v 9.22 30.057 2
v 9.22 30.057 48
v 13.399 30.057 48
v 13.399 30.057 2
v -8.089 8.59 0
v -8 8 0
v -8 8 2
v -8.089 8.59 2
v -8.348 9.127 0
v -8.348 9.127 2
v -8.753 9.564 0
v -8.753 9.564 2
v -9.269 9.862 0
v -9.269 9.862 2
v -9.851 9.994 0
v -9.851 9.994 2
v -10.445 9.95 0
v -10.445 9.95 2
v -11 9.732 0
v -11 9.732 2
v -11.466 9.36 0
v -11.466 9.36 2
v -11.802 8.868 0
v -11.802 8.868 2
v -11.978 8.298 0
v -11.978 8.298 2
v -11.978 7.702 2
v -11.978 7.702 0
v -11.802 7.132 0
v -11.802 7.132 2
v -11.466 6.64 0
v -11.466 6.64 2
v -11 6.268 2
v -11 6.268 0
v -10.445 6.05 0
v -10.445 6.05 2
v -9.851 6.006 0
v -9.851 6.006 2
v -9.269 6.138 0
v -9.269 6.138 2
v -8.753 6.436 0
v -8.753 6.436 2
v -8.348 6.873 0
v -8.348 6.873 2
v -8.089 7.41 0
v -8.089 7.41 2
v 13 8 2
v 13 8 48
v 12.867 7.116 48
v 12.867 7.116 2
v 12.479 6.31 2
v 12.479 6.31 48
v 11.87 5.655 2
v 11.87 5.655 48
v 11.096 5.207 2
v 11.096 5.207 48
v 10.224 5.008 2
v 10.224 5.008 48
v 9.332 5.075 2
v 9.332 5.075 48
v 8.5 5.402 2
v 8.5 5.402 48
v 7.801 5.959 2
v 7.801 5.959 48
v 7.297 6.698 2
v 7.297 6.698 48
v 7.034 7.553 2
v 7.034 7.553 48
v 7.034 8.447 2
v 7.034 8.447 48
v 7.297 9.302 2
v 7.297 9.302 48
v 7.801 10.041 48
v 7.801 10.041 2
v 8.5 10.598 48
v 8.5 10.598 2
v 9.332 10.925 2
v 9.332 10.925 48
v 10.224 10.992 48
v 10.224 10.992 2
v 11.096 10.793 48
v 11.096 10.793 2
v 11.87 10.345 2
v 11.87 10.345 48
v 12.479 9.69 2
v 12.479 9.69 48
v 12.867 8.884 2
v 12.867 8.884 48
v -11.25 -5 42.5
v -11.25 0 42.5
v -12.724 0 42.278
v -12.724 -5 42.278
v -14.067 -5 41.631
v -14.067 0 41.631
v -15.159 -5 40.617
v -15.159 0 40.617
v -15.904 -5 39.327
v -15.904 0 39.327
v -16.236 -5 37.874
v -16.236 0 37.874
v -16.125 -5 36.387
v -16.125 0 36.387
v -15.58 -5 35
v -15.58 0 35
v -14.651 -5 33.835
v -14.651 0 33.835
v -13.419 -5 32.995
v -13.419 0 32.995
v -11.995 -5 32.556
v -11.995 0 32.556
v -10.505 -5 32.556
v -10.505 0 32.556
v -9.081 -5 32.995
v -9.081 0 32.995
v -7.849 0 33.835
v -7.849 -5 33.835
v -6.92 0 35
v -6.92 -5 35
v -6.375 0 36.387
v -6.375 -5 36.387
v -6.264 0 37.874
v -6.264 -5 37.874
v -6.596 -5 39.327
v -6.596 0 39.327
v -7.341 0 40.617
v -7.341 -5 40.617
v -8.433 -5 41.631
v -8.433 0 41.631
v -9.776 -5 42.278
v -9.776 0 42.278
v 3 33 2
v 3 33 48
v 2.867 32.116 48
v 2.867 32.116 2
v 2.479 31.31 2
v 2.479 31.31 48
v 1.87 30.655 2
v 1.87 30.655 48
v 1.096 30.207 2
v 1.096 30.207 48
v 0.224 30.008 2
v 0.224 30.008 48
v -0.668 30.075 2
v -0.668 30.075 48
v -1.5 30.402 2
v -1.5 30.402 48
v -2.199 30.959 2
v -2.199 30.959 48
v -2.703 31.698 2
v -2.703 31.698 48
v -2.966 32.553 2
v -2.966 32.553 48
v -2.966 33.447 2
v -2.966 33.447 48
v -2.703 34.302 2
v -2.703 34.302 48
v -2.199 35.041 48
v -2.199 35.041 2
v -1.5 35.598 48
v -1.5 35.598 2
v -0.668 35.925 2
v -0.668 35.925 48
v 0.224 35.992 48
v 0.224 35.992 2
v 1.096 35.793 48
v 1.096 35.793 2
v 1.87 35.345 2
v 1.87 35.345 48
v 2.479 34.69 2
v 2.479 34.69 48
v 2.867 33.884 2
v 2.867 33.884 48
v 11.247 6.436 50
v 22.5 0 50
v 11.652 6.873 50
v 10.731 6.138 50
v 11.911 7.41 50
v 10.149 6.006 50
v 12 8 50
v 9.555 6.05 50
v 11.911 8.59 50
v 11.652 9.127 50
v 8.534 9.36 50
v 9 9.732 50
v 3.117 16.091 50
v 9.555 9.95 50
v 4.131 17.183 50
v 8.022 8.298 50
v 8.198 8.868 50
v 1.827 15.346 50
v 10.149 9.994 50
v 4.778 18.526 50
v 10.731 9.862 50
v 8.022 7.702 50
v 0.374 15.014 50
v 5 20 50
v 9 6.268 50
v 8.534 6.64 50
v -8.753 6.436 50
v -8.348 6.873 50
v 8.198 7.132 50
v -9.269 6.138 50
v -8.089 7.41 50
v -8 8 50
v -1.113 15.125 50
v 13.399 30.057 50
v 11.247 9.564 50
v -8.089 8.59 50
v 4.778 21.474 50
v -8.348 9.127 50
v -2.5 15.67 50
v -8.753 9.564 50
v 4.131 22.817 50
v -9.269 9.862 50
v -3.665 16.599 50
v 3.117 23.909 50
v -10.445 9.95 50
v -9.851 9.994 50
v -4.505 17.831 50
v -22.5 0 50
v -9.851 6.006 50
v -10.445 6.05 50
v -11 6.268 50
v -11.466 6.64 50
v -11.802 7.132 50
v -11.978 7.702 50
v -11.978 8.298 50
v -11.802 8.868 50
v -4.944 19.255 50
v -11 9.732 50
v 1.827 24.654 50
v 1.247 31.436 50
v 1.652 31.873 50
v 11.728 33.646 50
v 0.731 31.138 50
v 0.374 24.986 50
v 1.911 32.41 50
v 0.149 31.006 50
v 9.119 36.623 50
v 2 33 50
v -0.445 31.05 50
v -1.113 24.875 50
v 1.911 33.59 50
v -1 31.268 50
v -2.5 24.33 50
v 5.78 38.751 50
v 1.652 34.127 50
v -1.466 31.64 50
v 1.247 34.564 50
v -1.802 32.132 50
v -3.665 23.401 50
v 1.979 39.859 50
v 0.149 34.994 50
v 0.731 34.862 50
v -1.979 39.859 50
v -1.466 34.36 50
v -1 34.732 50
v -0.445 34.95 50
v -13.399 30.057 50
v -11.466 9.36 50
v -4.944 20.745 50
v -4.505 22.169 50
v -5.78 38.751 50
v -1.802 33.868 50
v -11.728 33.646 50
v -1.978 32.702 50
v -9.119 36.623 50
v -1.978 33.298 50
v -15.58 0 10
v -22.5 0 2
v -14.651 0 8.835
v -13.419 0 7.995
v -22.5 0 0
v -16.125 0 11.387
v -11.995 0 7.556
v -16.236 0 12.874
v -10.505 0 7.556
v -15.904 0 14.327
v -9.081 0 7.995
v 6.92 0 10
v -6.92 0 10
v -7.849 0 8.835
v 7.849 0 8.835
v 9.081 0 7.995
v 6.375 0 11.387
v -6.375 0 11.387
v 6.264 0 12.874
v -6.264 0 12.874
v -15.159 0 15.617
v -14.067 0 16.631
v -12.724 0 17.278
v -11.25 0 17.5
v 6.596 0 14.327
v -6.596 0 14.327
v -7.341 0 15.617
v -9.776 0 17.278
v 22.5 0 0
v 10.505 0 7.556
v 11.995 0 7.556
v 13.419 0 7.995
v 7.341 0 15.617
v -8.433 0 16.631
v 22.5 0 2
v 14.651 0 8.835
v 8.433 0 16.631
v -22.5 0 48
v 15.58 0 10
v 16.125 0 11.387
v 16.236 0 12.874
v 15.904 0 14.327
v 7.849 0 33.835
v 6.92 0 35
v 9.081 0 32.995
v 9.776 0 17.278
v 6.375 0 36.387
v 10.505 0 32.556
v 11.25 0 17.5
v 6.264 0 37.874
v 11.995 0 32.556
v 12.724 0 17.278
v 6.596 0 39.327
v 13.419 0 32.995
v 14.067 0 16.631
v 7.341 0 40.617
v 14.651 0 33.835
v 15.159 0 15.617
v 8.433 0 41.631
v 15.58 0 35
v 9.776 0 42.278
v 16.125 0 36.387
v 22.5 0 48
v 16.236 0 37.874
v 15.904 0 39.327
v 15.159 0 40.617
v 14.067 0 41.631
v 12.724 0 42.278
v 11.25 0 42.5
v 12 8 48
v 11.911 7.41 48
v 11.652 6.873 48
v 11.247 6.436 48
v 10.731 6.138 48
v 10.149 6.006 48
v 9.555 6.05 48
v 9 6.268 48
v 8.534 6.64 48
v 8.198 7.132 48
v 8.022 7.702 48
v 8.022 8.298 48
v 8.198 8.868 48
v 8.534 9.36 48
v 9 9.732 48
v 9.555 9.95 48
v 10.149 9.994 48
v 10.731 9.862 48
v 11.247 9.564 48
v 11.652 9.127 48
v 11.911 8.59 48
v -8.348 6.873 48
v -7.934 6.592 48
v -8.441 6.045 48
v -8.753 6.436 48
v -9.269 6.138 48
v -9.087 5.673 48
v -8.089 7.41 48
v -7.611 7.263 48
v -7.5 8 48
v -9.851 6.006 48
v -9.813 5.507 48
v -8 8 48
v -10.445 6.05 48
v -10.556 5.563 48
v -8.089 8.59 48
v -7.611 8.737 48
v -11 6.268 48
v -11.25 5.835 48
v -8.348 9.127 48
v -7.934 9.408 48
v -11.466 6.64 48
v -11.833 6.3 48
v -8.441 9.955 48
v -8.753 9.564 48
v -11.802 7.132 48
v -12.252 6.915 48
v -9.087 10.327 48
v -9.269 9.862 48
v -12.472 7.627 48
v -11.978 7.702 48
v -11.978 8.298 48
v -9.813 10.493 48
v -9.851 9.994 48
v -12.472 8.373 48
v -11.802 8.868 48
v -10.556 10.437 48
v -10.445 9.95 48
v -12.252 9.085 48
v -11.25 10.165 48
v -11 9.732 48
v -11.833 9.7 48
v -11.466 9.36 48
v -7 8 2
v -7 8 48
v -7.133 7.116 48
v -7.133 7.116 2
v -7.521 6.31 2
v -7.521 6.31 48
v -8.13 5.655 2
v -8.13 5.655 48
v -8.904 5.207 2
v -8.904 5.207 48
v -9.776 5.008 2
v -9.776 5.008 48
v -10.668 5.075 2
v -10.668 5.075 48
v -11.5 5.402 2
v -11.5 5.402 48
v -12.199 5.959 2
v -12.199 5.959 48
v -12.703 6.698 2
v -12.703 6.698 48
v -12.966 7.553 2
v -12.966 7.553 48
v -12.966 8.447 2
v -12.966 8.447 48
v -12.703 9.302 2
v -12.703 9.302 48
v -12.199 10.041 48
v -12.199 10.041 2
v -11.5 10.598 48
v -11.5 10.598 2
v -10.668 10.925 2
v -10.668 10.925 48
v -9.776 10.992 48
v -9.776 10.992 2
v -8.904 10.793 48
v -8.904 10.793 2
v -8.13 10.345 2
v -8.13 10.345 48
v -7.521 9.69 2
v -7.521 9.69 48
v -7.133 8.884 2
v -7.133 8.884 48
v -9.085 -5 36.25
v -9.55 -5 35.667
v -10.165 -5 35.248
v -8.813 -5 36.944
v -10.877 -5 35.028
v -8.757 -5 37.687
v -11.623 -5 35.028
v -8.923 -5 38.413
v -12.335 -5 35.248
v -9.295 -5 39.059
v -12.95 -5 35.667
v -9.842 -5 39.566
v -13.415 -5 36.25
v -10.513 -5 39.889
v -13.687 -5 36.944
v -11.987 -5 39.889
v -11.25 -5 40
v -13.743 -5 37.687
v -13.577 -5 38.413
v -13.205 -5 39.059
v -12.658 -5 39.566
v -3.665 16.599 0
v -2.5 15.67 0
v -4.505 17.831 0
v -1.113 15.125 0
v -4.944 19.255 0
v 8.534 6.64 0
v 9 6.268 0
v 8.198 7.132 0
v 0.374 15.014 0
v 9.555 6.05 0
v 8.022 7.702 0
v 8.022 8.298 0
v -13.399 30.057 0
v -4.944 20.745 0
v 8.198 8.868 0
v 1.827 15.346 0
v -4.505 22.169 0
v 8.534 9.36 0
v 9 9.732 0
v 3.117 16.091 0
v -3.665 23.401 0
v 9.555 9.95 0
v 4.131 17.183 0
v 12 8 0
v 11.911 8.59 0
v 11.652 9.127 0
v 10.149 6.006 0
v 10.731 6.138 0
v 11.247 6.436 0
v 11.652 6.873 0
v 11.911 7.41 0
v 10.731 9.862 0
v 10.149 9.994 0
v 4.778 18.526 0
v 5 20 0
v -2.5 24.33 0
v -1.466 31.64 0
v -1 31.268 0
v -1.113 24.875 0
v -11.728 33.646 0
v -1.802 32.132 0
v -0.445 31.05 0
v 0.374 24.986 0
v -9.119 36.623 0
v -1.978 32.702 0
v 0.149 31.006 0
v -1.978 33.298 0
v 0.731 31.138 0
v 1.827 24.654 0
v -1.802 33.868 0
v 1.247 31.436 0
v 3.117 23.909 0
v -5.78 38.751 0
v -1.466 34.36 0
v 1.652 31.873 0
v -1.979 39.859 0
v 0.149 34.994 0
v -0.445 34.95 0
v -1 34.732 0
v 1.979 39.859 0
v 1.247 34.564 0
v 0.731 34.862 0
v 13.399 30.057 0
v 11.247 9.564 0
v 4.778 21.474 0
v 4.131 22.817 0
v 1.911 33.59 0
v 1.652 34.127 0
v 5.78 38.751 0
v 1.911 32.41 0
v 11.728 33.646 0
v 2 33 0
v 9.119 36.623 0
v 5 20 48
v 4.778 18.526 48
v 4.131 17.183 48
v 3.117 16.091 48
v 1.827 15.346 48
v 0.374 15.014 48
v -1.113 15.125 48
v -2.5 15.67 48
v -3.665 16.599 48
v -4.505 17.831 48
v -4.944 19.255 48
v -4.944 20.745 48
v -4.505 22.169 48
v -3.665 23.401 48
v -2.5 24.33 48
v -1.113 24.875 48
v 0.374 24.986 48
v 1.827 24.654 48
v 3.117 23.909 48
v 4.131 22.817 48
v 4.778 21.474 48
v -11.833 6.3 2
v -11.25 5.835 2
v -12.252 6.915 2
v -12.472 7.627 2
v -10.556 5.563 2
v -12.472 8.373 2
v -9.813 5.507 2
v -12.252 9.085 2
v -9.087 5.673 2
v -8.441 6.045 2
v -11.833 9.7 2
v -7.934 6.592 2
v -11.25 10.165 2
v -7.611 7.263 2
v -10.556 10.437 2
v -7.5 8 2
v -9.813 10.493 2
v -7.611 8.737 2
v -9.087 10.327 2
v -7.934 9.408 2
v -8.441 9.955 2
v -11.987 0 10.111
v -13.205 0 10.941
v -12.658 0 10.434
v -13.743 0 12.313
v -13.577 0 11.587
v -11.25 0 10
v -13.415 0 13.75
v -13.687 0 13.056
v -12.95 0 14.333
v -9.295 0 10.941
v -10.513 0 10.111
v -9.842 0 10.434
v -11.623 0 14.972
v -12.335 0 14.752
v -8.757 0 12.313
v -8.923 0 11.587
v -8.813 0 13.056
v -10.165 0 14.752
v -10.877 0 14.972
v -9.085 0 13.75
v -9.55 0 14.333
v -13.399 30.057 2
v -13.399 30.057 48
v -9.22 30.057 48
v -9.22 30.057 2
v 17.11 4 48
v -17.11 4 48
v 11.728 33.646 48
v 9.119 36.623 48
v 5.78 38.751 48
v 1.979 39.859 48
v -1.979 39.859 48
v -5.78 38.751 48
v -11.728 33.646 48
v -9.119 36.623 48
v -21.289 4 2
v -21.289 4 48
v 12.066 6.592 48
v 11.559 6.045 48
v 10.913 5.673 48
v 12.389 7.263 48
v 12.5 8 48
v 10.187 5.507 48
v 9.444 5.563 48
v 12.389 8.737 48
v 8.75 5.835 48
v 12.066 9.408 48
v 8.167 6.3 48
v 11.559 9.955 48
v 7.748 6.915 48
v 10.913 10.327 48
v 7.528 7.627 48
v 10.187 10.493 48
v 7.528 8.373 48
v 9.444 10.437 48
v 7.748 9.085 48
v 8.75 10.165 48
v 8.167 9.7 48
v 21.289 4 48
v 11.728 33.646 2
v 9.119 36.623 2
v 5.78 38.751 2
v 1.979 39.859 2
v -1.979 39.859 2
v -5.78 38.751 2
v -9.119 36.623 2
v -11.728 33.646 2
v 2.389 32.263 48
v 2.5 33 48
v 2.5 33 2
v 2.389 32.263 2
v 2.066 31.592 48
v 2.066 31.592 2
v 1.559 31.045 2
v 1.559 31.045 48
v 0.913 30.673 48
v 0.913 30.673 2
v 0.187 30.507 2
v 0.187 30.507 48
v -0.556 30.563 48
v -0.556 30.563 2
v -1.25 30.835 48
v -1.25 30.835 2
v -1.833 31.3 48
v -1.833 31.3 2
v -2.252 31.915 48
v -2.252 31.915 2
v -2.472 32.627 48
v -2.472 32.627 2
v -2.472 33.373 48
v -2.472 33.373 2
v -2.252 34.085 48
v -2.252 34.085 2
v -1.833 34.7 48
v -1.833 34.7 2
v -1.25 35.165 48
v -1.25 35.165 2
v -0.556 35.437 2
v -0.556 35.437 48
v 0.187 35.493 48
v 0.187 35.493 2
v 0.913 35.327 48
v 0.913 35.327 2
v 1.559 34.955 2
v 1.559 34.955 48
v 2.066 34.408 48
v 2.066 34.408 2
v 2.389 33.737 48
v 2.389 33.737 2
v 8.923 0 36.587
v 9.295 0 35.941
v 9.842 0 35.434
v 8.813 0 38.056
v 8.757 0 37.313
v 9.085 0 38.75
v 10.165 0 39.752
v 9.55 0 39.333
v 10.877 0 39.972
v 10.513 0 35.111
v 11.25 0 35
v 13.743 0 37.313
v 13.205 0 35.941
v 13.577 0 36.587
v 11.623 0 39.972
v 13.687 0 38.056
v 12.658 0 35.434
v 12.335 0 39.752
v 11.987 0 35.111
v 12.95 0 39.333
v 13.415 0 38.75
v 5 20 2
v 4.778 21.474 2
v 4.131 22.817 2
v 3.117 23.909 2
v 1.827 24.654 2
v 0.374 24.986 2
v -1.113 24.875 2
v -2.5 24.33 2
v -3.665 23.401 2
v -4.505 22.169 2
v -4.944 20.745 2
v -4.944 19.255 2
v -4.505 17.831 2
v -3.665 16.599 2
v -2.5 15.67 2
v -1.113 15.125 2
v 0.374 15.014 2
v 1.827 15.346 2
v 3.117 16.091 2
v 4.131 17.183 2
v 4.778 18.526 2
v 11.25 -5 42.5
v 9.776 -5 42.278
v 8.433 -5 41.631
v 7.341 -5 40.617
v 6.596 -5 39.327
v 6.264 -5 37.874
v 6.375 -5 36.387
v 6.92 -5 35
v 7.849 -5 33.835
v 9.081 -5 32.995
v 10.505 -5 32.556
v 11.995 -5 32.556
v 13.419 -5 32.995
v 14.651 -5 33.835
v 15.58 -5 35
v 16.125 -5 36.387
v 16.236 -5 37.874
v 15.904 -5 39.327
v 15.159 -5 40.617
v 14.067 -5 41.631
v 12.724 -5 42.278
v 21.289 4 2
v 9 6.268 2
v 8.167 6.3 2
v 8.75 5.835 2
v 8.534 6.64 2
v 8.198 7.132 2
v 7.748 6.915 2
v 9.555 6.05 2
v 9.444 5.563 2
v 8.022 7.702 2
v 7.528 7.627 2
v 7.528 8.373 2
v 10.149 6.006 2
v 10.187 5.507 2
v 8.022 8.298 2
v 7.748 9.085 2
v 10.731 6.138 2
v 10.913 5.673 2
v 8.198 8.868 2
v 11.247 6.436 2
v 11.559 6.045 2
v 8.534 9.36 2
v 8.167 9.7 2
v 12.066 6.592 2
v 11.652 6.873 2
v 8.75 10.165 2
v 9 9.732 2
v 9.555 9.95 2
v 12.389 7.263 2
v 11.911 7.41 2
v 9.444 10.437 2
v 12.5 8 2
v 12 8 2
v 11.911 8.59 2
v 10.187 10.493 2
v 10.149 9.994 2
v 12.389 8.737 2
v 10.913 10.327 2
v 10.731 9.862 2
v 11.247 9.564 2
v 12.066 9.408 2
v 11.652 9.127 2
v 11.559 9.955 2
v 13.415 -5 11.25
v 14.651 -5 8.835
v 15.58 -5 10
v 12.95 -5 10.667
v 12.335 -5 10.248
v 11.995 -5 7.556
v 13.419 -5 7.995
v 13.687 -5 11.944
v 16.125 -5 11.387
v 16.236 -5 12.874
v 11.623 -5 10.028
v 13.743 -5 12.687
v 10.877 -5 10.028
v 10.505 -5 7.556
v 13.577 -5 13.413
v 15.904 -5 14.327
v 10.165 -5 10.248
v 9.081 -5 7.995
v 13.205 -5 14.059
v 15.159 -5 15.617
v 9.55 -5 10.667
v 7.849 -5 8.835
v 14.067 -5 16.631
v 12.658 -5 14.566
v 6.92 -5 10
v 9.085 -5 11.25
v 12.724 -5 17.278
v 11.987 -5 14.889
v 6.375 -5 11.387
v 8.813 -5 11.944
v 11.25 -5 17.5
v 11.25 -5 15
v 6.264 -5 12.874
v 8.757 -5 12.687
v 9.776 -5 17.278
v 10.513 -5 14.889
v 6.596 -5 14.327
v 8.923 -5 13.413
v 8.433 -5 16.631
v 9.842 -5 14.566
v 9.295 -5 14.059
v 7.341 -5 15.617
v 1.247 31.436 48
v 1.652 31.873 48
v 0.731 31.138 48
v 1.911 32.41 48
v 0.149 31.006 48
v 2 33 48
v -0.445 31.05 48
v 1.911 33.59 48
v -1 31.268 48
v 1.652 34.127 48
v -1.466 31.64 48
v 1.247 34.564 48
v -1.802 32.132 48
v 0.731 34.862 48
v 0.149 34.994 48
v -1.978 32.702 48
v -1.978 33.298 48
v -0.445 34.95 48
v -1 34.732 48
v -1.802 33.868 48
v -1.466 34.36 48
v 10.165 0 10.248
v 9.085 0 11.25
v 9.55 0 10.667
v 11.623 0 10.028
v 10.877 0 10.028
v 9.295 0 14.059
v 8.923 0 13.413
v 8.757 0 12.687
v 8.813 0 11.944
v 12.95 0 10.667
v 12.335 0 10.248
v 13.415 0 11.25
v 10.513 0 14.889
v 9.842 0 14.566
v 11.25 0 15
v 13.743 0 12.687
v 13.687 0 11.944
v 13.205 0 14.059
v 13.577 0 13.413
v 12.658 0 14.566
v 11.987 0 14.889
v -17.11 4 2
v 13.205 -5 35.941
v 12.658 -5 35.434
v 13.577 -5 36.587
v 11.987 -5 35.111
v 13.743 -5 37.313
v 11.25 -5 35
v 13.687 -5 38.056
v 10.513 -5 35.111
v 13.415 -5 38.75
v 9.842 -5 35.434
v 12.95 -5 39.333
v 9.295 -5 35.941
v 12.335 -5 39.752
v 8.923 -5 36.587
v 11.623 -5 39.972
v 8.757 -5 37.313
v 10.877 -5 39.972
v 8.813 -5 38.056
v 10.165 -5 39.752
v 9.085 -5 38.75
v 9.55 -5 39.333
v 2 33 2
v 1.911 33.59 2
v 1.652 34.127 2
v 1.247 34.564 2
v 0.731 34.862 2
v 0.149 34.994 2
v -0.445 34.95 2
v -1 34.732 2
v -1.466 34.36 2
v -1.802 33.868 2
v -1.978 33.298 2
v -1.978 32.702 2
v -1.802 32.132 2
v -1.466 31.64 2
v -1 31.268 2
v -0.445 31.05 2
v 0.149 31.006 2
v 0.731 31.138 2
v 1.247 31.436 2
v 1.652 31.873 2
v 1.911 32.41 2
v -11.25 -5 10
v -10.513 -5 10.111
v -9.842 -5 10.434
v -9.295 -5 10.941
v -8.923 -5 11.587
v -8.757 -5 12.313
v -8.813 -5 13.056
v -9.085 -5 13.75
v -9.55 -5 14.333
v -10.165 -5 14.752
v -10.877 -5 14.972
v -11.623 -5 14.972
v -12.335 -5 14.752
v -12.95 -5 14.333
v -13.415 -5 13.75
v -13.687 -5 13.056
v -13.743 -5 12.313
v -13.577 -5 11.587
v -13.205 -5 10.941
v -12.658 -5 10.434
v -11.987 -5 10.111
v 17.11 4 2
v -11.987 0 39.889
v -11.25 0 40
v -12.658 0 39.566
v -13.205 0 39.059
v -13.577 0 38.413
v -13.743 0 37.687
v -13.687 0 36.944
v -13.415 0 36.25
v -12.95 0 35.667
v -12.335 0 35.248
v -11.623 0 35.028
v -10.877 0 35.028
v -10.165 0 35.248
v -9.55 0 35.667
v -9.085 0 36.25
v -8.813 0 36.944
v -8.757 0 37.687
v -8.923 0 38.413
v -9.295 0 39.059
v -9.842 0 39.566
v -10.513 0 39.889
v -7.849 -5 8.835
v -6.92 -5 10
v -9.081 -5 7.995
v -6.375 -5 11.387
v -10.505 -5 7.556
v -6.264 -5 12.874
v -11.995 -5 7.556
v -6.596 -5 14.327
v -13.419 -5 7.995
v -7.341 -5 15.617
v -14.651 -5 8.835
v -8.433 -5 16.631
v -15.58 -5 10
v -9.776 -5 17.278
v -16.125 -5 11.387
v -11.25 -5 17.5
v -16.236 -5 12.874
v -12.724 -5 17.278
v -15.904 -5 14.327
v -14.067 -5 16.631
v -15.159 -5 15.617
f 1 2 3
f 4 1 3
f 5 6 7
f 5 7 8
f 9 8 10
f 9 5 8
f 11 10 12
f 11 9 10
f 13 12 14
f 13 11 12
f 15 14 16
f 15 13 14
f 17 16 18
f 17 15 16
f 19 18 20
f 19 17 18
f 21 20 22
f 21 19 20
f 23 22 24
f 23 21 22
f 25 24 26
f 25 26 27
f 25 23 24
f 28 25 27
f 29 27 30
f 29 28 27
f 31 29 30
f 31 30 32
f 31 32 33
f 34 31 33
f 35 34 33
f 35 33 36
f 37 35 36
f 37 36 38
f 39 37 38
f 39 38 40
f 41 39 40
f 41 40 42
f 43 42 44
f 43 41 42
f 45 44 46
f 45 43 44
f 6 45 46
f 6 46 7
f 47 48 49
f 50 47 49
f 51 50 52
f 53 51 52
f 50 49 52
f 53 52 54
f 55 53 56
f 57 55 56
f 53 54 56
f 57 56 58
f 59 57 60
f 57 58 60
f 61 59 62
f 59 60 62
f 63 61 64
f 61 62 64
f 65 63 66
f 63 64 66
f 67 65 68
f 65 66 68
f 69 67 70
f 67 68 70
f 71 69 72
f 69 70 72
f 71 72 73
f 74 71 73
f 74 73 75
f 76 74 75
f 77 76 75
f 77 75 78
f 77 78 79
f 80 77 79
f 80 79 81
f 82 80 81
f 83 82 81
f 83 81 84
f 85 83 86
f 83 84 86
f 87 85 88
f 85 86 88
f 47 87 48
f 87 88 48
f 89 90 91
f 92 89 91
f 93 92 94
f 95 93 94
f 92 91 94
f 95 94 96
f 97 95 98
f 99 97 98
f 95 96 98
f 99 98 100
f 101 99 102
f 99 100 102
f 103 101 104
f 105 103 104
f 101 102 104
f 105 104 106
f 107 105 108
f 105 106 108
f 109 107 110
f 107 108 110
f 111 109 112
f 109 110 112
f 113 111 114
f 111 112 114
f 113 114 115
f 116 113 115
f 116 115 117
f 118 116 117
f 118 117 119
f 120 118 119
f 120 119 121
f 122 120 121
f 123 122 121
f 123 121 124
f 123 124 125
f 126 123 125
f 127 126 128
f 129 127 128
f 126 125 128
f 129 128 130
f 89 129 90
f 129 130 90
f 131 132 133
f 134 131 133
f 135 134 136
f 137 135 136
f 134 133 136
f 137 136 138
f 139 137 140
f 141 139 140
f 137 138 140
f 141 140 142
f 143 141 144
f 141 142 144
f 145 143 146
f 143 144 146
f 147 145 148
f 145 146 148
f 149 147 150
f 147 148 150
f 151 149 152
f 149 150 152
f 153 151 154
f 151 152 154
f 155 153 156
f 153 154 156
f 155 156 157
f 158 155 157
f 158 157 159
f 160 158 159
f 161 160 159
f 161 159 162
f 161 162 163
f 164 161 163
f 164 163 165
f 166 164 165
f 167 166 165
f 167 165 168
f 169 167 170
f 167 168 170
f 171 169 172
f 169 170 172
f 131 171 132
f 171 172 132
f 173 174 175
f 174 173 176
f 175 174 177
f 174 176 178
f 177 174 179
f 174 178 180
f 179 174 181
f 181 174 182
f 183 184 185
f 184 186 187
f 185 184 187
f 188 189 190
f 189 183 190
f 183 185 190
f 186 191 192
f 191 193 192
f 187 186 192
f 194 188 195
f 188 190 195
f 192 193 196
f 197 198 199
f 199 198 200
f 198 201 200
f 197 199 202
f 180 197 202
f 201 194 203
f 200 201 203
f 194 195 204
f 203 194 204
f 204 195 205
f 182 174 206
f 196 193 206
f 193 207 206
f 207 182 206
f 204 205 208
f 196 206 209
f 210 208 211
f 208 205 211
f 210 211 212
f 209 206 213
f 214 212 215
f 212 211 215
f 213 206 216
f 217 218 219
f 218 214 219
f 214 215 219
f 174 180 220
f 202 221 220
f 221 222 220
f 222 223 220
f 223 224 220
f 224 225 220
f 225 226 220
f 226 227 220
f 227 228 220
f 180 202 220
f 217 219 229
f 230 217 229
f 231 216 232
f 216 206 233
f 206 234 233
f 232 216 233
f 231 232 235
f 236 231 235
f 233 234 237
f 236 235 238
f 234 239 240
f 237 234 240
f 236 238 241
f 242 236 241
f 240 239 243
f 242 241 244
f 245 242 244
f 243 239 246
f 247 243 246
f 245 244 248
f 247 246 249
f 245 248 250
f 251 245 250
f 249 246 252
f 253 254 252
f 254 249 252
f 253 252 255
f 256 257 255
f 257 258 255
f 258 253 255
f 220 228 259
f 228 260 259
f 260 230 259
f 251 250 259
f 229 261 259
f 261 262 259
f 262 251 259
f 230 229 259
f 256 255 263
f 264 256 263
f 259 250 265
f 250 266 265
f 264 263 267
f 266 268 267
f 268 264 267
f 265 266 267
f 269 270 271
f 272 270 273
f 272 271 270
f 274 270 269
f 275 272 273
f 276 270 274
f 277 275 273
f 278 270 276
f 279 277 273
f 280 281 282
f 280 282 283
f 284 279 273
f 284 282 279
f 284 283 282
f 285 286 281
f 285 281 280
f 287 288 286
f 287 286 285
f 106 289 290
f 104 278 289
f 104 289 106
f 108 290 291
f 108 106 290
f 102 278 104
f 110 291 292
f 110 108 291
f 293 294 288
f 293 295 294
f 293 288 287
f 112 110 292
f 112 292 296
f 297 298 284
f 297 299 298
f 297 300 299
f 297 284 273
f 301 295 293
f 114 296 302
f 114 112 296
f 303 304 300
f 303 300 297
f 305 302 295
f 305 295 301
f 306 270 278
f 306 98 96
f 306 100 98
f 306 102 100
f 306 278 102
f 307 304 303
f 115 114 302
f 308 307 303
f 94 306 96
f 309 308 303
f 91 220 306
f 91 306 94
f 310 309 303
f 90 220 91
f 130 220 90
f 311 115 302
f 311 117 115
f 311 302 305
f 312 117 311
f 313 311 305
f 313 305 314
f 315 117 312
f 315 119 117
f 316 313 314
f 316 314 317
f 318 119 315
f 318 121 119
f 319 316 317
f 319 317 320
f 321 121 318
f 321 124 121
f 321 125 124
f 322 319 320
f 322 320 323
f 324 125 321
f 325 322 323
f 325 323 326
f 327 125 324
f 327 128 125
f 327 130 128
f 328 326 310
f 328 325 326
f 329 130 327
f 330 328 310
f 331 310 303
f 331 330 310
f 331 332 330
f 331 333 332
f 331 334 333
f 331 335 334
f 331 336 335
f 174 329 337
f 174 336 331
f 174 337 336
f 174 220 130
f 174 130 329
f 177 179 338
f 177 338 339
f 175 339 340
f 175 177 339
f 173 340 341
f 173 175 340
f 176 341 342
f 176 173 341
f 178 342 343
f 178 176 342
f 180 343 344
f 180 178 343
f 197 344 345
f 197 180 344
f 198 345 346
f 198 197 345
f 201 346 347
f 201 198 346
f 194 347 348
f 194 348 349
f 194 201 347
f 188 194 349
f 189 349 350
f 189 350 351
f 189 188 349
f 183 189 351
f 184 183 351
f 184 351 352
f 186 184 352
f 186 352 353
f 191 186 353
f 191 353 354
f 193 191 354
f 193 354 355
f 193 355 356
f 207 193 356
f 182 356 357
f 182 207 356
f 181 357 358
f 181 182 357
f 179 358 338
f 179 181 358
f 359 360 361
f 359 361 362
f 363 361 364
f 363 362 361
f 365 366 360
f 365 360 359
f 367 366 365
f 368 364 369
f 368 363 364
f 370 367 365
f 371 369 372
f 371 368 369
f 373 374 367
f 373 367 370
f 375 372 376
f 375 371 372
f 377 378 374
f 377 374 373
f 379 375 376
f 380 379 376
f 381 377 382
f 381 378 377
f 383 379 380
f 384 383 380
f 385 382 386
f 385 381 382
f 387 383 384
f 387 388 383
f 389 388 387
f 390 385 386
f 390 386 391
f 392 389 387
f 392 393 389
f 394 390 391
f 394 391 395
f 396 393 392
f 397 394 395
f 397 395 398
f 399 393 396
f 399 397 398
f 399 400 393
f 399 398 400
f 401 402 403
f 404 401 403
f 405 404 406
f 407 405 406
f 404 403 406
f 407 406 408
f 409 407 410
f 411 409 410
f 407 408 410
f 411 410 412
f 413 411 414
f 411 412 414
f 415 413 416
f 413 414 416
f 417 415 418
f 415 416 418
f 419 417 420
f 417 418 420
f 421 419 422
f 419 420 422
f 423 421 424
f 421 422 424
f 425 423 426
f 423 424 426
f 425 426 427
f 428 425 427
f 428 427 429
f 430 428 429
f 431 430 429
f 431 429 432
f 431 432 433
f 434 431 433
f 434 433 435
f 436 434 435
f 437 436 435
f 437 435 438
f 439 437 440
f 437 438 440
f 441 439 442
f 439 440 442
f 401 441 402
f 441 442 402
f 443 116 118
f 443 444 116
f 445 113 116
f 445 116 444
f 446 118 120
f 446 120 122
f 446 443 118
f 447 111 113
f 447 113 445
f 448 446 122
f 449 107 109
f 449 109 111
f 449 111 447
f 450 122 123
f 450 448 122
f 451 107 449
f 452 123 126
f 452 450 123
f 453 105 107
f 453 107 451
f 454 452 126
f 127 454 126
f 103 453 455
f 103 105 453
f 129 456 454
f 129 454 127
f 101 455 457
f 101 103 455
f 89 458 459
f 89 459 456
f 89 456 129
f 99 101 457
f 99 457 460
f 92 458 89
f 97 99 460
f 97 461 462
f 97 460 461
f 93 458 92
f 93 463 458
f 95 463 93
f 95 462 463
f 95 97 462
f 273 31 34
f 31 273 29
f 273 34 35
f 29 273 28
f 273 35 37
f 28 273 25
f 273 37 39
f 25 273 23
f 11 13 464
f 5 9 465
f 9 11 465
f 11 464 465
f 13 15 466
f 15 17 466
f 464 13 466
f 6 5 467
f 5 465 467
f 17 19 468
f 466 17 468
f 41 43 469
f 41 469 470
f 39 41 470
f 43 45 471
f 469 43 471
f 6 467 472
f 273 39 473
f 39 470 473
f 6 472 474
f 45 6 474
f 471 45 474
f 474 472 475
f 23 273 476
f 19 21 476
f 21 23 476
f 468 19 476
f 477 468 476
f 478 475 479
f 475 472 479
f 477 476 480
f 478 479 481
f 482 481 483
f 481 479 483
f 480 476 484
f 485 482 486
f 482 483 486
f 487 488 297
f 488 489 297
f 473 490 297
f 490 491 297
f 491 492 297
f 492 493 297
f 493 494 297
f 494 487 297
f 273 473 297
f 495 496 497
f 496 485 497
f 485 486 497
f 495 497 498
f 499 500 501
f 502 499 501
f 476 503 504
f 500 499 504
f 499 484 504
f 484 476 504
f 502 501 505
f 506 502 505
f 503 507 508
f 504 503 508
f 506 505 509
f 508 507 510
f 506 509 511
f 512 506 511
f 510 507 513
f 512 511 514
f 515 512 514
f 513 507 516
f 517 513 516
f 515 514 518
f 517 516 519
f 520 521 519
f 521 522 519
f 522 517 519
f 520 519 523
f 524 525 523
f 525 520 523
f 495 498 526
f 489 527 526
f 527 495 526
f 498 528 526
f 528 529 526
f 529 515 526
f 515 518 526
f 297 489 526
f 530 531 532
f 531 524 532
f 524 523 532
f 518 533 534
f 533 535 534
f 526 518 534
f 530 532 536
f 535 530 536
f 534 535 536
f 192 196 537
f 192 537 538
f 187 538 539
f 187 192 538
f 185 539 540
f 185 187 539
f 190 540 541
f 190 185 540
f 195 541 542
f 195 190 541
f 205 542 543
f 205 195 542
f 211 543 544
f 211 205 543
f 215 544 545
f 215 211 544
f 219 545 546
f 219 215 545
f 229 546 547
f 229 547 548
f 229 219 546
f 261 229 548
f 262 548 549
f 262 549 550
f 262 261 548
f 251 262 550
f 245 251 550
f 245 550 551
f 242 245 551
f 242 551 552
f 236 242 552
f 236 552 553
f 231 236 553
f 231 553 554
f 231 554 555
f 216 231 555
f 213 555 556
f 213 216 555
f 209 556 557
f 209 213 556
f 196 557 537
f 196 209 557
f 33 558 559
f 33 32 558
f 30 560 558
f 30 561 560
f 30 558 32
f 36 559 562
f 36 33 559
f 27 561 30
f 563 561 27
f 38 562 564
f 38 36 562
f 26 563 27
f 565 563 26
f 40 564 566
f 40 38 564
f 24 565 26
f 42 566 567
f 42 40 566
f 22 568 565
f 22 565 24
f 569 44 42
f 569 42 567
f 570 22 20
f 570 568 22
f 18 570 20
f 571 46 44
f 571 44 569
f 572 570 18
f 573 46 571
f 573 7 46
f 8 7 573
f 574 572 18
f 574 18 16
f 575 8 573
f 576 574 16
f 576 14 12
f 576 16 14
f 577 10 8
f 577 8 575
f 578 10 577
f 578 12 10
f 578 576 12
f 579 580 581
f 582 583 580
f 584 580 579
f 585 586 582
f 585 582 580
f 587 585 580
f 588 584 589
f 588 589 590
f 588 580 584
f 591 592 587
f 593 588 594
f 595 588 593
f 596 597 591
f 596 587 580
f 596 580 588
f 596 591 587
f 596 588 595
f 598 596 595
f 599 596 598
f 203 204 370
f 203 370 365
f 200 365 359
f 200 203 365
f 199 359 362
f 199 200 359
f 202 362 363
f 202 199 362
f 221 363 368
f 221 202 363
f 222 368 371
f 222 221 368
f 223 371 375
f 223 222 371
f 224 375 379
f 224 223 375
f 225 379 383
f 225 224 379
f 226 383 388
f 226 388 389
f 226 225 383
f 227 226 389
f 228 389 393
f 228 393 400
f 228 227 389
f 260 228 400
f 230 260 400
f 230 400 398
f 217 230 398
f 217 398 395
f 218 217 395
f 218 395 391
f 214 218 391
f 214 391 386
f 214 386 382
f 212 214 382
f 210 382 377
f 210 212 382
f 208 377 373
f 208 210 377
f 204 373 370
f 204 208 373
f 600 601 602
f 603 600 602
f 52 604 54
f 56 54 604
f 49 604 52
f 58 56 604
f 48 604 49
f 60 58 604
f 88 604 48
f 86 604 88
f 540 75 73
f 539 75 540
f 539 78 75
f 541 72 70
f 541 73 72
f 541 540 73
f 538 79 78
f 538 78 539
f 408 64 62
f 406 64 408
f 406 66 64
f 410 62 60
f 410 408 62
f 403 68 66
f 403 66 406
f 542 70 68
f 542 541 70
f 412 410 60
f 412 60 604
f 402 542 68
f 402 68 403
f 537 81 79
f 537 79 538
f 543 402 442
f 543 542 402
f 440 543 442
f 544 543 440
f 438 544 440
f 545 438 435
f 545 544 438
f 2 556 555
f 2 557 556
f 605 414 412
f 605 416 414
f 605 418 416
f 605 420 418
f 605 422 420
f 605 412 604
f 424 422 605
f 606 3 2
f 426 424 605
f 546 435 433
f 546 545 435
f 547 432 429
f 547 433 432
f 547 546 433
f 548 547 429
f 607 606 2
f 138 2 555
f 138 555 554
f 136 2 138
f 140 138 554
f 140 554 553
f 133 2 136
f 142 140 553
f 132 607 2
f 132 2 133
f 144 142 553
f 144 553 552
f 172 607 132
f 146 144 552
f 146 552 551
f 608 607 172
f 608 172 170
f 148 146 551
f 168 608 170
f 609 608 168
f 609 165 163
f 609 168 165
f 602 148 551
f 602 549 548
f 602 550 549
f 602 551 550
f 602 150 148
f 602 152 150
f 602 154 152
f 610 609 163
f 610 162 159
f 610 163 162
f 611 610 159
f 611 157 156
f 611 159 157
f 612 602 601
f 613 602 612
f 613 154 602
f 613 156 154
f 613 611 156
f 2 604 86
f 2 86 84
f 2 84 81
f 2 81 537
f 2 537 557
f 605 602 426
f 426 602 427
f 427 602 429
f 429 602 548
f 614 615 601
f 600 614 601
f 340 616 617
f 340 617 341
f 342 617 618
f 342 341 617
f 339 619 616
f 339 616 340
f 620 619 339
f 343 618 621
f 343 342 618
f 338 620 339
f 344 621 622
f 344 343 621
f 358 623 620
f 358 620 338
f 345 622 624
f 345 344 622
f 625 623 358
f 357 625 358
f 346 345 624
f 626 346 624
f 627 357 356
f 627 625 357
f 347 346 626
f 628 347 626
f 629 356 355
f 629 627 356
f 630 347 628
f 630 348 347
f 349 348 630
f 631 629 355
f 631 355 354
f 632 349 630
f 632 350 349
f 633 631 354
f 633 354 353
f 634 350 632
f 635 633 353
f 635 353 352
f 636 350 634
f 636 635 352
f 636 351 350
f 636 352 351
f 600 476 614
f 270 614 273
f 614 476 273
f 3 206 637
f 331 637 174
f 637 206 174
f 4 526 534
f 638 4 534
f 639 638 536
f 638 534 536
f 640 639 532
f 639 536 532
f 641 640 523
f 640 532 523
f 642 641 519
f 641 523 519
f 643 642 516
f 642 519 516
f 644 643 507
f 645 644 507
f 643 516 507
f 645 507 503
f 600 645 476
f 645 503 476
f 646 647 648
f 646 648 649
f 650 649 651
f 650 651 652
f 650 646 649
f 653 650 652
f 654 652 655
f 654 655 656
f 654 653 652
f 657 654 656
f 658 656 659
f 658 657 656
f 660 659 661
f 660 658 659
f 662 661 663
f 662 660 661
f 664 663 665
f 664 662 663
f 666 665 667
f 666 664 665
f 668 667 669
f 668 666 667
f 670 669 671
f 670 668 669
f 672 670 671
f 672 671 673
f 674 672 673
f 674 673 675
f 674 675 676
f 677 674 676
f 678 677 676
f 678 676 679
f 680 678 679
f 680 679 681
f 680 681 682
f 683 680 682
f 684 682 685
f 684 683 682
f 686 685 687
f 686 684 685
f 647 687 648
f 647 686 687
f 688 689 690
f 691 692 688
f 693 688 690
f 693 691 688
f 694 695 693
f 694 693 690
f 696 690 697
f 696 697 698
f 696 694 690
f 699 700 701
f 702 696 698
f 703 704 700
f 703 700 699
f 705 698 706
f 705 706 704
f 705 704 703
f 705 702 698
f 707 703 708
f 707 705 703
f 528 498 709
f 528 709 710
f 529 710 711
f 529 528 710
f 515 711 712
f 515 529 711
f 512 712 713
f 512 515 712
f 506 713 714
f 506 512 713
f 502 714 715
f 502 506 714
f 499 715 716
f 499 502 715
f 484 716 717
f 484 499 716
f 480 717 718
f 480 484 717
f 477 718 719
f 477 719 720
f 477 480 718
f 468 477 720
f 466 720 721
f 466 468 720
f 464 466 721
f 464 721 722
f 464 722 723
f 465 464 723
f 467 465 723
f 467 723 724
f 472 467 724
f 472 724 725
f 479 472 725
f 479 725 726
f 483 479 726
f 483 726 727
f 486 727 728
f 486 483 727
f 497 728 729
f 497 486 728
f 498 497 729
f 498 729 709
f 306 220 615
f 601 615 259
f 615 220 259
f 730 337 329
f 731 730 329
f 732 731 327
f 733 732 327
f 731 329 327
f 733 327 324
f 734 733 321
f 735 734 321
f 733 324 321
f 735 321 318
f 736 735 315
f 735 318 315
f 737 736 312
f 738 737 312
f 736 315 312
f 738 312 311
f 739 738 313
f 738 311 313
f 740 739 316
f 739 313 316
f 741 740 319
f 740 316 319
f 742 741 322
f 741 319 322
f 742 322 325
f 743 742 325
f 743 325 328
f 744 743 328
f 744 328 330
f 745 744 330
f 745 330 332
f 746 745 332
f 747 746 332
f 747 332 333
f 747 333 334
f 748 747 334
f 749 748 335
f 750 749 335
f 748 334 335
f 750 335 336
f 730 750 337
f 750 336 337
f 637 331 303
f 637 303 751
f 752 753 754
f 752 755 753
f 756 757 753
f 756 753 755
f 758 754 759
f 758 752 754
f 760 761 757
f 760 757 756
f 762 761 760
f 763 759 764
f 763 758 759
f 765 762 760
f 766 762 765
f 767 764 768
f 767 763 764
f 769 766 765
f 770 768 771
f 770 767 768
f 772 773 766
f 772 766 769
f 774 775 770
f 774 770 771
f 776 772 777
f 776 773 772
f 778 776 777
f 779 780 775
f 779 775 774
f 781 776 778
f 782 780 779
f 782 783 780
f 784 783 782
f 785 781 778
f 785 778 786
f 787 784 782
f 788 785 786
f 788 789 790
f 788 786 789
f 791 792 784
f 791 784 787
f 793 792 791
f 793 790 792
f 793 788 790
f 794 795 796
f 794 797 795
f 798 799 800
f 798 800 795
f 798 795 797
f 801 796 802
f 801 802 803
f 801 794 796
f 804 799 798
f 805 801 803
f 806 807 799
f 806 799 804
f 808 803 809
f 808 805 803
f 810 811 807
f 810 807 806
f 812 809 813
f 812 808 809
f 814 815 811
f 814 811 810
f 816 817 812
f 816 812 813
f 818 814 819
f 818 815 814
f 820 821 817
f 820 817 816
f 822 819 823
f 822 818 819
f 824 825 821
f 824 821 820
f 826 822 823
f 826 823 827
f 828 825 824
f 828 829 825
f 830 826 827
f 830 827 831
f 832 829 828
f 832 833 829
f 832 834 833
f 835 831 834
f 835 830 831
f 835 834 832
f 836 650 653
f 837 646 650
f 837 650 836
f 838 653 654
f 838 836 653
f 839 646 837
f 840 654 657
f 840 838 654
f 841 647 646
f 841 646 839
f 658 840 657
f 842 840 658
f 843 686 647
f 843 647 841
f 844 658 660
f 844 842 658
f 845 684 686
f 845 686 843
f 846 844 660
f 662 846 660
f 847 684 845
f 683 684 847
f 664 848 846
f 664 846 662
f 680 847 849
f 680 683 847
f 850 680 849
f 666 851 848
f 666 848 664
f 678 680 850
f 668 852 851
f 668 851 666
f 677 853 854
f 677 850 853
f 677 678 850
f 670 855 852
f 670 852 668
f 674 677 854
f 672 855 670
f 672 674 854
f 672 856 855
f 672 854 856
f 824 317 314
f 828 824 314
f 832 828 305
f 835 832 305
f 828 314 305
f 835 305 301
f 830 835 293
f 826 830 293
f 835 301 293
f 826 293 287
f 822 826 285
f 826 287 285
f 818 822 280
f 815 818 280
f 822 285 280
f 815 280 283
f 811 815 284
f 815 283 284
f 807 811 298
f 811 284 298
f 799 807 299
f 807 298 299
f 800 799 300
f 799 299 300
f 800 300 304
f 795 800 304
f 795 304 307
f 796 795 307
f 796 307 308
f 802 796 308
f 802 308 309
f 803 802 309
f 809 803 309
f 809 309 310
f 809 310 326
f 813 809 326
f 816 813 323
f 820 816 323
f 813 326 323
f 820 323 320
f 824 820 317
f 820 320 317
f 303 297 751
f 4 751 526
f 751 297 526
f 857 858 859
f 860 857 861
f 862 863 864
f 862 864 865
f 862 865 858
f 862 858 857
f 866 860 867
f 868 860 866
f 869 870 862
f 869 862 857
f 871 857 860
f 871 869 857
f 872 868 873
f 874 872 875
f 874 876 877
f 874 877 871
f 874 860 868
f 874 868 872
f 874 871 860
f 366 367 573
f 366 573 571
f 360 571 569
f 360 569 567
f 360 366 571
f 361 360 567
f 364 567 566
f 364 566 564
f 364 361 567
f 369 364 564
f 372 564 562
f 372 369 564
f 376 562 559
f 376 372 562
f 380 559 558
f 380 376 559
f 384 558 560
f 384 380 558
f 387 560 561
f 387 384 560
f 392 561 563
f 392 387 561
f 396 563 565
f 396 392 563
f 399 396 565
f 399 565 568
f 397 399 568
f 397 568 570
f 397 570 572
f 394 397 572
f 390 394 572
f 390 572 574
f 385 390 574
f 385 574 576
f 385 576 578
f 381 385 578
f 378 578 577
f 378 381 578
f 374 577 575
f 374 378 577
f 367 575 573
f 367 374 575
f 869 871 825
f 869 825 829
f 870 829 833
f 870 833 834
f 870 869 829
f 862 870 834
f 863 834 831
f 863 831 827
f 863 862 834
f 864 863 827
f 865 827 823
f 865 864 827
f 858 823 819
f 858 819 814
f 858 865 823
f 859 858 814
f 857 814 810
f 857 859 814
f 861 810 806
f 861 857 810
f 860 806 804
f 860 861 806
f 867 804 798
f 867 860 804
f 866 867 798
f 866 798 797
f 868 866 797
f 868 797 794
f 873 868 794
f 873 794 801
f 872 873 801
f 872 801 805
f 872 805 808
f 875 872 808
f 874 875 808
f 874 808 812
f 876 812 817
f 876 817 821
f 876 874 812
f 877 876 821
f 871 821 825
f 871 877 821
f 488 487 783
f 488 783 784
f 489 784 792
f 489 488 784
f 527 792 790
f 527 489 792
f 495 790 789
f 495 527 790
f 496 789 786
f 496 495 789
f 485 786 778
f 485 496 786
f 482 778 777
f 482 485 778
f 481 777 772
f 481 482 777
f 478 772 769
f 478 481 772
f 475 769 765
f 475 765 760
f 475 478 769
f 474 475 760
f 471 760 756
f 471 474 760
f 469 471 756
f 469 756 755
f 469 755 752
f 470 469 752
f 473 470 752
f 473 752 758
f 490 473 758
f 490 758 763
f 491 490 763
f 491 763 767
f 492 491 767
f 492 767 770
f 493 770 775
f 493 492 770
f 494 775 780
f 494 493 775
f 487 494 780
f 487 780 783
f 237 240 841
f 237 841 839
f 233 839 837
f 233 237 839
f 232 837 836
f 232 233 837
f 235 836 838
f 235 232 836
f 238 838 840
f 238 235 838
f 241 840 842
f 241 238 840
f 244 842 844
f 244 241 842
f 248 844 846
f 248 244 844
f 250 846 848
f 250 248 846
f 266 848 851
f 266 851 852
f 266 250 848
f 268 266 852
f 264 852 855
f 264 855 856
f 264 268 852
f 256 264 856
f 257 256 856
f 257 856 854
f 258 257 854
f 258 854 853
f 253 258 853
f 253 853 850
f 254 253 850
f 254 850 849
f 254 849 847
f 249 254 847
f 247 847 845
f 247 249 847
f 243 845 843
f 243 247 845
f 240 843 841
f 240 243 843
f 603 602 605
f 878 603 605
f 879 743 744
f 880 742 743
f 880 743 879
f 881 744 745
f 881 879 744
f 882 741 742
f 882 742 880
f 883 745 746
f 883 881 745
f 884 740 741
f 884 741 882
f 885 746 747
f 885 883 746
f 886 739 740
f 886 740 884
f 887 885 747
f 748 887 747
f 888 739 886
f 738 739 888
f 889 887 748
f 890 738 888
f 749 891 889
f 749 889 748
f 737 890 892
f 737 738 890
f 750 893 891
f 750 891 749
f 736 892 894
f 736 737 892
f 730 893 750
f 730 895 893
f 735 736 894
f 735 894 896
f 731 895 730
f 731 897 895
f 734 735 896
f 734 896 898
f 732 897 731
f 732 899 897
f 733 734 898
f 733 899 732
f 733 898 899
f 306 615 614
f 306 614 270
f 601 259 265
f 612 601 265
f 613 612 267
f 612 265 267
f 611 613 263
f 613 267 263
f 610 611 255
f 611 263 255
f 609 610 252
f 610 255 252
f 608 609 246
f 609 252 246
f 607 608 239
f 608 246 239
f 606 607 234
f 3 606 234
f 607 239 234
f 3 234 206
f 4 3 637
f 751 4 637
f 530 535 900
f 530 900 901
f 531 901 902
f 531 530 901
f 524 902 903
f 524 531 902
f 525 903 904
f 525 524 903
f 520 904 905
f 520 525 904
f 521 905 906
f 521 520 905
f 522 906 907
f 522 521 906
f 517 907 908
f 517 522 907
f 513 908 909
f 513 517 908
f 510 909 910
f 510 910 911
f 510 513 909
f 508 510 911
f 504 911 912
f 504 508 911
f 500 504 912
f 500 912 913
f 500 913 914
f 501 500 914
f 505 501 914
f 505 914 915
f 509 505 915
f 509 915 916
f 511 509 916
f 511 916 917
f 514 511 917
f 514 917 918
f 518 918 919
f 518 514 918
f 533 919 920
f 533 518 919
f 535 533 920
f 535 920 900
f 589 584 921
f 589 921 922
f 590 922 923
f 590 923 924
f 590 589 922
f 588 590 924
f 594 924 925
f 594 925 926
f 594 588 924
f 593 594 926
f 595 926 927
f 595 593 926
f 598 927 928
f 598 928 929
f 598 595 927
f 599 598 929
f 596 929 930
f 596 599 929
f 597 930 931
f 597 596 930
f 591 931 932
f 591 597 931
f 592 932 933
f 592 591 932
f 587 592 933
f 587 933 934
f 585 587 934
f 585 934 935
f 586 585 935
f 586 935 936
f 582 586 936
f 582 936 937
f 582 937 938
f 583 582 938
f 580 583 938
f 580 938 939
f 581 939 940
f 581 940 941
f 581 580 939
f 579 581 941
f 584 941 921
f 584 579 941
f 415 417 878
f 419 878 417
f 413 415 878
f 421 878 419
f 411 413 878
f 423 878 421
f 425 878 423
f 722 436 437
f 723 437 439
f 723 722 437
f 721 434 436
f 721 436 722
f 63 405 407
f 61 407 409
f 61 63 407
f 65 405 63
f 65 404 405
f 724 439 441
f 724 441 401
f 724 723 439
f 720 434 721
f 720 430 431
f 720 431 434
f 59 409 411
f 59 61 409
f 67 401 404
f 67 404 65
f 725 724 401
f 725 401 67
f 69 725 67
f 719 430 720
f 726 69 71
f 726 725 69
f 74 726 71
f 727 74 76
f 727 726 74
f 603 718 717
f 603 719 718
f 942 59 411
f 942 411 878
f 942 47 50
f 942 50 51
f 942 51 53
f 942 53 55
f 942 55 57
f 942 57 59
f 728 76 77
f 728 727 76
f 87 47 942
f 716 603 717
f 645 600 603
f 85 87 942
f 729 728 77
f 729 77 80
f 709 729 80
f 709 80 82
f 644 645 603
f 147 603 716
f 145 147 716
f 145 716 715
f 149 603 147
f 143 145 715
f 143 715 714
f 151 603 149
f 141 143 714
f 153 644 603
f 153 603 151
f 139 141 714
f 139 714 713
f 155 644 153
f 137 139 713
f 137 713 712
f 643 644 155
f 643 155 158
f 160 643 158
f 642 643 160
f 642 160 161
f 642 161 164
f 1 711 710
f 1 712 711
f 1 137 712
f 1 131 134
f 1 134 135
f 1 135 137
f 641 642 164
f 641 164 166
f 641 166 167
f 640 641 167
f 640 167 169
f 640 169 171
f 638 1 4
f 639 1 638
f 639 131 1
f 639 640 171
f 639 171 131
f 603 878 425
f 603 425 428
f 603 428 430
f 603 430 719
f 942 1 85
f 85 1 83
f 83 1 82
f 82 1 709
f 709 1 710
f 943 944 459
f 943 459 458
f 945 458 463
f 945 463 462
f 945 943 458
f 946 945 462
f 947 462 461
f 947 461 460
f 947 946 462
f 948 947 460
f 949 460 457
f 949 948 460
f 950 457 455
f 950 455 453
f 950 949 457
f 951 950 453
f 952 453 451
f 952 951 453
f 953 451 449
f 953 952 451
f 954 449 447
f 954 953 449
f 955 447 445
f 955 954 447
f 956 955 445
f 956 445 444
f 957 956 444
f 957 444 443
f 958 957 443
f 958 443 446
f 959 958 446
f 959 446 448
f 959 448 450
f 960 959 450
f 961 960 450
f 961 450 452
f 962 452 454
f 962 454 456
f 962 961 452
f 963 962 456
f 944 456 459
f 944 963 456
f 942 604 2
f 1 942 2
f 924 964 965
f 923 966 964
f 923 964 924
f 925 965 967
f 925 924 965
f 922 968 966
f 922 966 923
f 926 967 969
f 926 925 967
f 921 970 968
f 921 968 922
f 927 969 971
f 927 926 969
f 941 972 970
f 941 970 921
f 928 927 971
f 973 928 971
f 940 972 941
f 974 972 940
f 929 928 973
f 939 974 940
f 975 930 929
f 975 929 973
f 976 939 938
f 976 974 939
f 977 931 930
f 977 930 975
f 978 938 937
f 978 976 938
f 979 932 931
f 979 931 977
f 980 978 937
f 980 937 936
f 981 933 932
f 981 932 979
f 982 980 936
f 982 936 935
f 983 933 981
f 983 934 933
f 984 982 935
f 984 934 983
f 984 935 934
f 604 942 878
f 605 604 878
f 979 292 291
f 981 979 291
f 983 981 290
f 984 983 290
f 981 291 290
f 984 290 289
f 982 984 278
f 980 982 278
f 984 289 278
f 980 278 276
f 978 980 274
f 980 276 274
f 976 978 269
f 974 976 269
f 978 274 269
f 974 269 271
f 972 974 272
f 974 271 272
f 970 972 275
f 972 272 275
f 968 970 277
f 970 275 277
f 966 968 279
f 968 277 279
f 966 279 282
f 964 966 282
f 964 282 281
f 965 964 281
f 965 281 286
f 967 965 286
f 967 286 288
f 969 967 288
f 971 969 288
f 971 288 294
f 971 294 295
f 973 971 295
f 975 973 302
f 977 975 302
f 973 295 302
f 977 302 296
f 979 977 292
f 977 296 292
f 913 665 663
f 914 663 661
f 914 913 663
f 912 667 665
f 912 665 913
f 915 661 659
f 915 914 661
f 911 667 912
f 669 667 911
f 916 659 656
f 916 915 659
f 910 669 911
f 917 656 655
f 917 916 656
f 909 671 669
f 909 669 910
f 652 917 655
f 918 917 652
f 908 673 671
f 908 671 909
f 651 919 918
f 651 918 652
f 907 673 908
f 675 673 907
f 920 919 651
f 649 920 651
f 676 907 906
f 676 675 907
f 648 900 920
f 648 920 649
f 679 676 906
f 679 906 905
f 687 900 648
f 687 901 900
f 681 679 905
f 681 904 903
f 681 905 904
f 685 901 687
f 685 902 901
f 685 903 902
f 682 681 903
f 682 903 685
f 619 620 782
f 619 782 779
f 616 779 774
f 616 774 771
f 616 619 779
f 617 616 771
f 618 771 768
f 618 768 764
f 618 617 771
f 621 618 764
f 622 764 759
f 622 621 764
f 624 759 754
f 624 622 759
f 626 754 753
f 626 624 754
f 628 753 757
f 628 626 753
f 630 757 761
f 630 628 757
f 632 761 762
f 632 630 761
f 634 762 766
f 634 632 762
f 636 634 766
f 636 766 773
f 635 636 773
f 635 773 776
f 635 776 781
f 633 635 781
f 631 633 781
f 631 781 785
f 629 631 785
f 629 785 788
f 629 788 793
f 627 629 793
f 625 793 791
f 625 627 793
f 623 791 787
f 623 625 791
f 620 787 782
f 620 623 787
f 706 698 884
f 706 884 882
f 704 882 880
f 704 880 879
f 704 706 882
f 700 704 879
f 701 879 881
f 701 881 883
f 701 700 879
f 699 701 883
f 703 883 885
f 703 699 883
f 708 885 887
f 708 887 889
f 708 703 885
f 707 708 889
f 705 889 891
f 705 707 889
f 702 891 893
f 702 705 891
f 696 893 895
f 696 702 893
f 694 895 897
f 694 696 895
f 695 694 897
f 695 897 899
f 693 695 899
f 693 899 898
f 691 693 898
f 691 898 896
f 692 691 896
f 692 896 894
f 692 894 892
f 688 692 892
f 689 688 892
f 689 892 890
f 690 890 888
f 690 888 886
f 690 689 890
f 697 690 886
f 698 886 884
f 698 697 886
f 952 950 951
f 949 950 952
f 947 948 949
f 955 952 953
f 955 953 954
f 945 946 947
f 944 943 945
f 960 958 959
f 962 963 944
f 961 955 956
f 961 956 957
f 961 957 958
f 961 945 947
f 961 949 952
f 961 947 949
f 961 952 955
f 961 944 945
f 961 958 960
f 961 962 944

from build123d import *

# Parameters (mm, degrees)
SKETCH1_R           = 5
SKETCH1_R_2         = 2
BOSS_EXTRUDE1_DEPTH = 2
SKETCH2_R           = 2
SKETCH2_R_2         = 5
BOSS_EXTRUDE2_DEPTH = 2
SKETCH3_R           = 3
SKETCH3_R_2         = 2.5
BOSS_EXTRUDE3_DEPTH = 46
BOSS_EXTRUDE4_DEPTH = 46
BOSS_EXTRUDE5_DEPTH = 46
SKETCH8_R           = 5
SKETCH8_R_2         = 2.5
BOSS_EXTRUDE6_DEPTH = 5


with BuildPart() as part:
    # Sketch1 → Boss-Extrude1 (new body)
    with BuildSketch(Plane.XY):
        with BuildLine():
            Line((-22.5, 0), (22.5, 0))
            Line((22.5, 0), (13.399264765, 30.057056046))
            ThreePointArc((13.399264765, 30.057056046), (0, 40), (-13.399264765, 30.057056046))
            Line((-13.399264765, 30.057056046), (-22.5, 0))
        make_face()
        with Locations((0, 20)):
            Circle(SKETCH1_R, mode=Mode.SUBTRACT)
        with Locations((0, 33)):
            Circle(SKETCH1_R_2, mode=Mode.SUBTRACT)
        with Locations((10, 8)):
            Circle(SKETCH1_R_2, mode=Mode.SUBTRACT)
        with Locations((-10, 8)):
            Circle(SKETCH1_R_2, mode=Mode.SUBTRACT)
    extrude(amount=BOSS_EXTRUDE1_DEPTH)



with BuildPart() as body_2:
    # Sketch2 → Boss-Extrude2 (new body)
    with BuildSketch(Plane(origin=(0, 0, 50), x_dir=(-1, 0, 0), z_dir=(0, 0, -1))):
        with BuildLine():
            Line((-13.399264765, 30.057056046), (-22.5, 0))
            Line((-22.5, 0), (22.5, 0))
            Line((22.5, 0), (13.399264765, 30.057056046))
            ThreePointArc((13.399264765, 30.057056046), (0, 40), (-13.399264765, 30.057056046))
        make_face()
        with Locations(Location((-10, 8, 0), (0, 0, 180))):
            Circle(SKETCH2_R, mode=Mode.SUBTRACT)
        with Locations(Location((10, 8, 0), (0, 0, 180))):
            Circle(SKETCH2_R, mode=Mode.SUBTRACT)
        with Locations(Location((0, 20, 0), (0, 0, 180))):
            Circle(SKETCH2_R_2, mode=Mode.SUBTRACT)
        with Locations(Location((0, 33, 0), (0, 0, 180))):
            Circle(SKETCH2_R, mode=Mode.SUBTRACT)
    extrude(amount=BOSS_EXTRUDE2_DEPTH)


with BuildPart() as part_1:
    add(part.part)

    add(body_2.part)  # Boss-Extrude3 merges body 2
    # Sketch3 → Boss-Extrude3 (add)
    # profile 1 of 3: a face of its own
    with BuildSketch(Plane(origin=(0, 0, 48), x_dir=(-1, 0, 0), z_dir=(0, 0, -1))):
        with Locations(Location((10, 8, 0), (0, 0, 180))):
            Circle(SKETCH3_R)
        with Locations(Location((10, 8, 0), (0, 0, 180))):
            Circle(SKETCH3_R_2, mode=Mode.SUBTRACT)
    # profile 2 of 3: a face of its own
    with BuildSketch(Plane(origin=(0, 0, 48), x_dir=(-1, 0, 0), z_dir=(0, 0, -1))):
        with Locations(Location((0, 33, 0), (0, 0, 180))):
            Circle(SKETCH3_R)
        with Locations(Location((0, 33, 0), (0, 0, 180))):
            Circle(SKETCH3_R_2, mode=Mode.SUBTRACT)
    # profile 3 of 3: a face of its own
    with BuildSketch(Plane(origin=(0, 0, 48), x_dir=(-1, 0, 0), z_dir=(0, 0, -1))):
        with Locations(Location((-10, 8, 0), (0, 0, 180))):
            Circle(SKETCH3_R)
        with Locations(Location((-10, 8, 0), (0, 0, 180))):
            Circle(SKETCH3_R_2, mode=Mode.SUBTRACT)
    extrude(amount=BOSS_EXTRUDE3_DEPTH)

    # Sketch4 → Boss-Extrude4 (add)
    with BuildSketch(Plane(origin=(0, 0, 48), x_dir=(-1, 0, 0), z_dir=(0, 0, -1))):
        Polygon((22.5, 0), (-22.5, 0), (-21.288872041, 4), (21.288872041, 4), align=None)
    extrude(amount=BOSS_EXTRUDE4_DEPTH)

    # Sketch5 → Boss-Extrude5 (add)
    with BuildSketch(Plane(origin=(0, 0, 48), x_dir=(-1, 0, 0), z_dir=(0, 0, -1))):
        Polygon((17.109538251, 4), (21.288872041, 4), (13.399264765, 30.057056046), (9.219930974, 30.057056046), align=None)
        Polygon((-21.288872041, 4), (-17.109538251, 4), (-9.219930974, 30.057056046), (-13.399264765, 30.057056046), align=None)
    extrude(amount=BOSS_EXTRUDE5_DEPTH)

    # Sketch8 → Boss-Extrude6 (add)
    # profile 1 of 4: a face of its own
    with BuildSketch(Plane.XZ):
        with Locations(Location((-11.25, 12.5, 0), (0, 0, 90))):
            Circle(SKETCH8_R)
        with Locations(Location((-11.25, 12.5, 0), (0, 0, 270))):
            Circle(SKETCH8_R_2, mode=Mode.SUBTRACT)
    # profile 2 of 4: a face of its own
    with BuildSketch(Plane.XZ):
        with Locations(Location((-11.25, 37.5, 0), (0, 0, 90))):
            Circle(SKETCH8_R)
        with Locations(Location((-11.25, 37.5, 0), (0, 0, 90))):
            Circle(SKETCH8_R_2, mode=Mode.SUBTRACT)
    # profile 3 of 4: a face of its own
    with BuildSketch(Plane.XZ):
        with Locations(Location((11.25, 37.5, 0), (0, 0, 90))):
            Circle(SKETCH8_R)
        with Locations(Location((11.25, 37.5, 0), (0, 0, 270))):
            Circle(SKETCH8_R_2, mode=Mode.SUBTRACT)
    # profile 4 of 4: a face of its own
    with BuildSketch(Plane.XZ):
        with Locations(Location((11.25, 12.5, 0), (0, 0, 90))):
            Circle(SKETCH8_R)
        with Locations(Location((11.25, 12.5, 0), (0, 0, 90))):
            Circle(SKETCH8_R_2, mode=Mode.SUBTRACT)
    extrude(amount=BOSS_EXTRUDE6_DEPTH)


solid = part_1.part
